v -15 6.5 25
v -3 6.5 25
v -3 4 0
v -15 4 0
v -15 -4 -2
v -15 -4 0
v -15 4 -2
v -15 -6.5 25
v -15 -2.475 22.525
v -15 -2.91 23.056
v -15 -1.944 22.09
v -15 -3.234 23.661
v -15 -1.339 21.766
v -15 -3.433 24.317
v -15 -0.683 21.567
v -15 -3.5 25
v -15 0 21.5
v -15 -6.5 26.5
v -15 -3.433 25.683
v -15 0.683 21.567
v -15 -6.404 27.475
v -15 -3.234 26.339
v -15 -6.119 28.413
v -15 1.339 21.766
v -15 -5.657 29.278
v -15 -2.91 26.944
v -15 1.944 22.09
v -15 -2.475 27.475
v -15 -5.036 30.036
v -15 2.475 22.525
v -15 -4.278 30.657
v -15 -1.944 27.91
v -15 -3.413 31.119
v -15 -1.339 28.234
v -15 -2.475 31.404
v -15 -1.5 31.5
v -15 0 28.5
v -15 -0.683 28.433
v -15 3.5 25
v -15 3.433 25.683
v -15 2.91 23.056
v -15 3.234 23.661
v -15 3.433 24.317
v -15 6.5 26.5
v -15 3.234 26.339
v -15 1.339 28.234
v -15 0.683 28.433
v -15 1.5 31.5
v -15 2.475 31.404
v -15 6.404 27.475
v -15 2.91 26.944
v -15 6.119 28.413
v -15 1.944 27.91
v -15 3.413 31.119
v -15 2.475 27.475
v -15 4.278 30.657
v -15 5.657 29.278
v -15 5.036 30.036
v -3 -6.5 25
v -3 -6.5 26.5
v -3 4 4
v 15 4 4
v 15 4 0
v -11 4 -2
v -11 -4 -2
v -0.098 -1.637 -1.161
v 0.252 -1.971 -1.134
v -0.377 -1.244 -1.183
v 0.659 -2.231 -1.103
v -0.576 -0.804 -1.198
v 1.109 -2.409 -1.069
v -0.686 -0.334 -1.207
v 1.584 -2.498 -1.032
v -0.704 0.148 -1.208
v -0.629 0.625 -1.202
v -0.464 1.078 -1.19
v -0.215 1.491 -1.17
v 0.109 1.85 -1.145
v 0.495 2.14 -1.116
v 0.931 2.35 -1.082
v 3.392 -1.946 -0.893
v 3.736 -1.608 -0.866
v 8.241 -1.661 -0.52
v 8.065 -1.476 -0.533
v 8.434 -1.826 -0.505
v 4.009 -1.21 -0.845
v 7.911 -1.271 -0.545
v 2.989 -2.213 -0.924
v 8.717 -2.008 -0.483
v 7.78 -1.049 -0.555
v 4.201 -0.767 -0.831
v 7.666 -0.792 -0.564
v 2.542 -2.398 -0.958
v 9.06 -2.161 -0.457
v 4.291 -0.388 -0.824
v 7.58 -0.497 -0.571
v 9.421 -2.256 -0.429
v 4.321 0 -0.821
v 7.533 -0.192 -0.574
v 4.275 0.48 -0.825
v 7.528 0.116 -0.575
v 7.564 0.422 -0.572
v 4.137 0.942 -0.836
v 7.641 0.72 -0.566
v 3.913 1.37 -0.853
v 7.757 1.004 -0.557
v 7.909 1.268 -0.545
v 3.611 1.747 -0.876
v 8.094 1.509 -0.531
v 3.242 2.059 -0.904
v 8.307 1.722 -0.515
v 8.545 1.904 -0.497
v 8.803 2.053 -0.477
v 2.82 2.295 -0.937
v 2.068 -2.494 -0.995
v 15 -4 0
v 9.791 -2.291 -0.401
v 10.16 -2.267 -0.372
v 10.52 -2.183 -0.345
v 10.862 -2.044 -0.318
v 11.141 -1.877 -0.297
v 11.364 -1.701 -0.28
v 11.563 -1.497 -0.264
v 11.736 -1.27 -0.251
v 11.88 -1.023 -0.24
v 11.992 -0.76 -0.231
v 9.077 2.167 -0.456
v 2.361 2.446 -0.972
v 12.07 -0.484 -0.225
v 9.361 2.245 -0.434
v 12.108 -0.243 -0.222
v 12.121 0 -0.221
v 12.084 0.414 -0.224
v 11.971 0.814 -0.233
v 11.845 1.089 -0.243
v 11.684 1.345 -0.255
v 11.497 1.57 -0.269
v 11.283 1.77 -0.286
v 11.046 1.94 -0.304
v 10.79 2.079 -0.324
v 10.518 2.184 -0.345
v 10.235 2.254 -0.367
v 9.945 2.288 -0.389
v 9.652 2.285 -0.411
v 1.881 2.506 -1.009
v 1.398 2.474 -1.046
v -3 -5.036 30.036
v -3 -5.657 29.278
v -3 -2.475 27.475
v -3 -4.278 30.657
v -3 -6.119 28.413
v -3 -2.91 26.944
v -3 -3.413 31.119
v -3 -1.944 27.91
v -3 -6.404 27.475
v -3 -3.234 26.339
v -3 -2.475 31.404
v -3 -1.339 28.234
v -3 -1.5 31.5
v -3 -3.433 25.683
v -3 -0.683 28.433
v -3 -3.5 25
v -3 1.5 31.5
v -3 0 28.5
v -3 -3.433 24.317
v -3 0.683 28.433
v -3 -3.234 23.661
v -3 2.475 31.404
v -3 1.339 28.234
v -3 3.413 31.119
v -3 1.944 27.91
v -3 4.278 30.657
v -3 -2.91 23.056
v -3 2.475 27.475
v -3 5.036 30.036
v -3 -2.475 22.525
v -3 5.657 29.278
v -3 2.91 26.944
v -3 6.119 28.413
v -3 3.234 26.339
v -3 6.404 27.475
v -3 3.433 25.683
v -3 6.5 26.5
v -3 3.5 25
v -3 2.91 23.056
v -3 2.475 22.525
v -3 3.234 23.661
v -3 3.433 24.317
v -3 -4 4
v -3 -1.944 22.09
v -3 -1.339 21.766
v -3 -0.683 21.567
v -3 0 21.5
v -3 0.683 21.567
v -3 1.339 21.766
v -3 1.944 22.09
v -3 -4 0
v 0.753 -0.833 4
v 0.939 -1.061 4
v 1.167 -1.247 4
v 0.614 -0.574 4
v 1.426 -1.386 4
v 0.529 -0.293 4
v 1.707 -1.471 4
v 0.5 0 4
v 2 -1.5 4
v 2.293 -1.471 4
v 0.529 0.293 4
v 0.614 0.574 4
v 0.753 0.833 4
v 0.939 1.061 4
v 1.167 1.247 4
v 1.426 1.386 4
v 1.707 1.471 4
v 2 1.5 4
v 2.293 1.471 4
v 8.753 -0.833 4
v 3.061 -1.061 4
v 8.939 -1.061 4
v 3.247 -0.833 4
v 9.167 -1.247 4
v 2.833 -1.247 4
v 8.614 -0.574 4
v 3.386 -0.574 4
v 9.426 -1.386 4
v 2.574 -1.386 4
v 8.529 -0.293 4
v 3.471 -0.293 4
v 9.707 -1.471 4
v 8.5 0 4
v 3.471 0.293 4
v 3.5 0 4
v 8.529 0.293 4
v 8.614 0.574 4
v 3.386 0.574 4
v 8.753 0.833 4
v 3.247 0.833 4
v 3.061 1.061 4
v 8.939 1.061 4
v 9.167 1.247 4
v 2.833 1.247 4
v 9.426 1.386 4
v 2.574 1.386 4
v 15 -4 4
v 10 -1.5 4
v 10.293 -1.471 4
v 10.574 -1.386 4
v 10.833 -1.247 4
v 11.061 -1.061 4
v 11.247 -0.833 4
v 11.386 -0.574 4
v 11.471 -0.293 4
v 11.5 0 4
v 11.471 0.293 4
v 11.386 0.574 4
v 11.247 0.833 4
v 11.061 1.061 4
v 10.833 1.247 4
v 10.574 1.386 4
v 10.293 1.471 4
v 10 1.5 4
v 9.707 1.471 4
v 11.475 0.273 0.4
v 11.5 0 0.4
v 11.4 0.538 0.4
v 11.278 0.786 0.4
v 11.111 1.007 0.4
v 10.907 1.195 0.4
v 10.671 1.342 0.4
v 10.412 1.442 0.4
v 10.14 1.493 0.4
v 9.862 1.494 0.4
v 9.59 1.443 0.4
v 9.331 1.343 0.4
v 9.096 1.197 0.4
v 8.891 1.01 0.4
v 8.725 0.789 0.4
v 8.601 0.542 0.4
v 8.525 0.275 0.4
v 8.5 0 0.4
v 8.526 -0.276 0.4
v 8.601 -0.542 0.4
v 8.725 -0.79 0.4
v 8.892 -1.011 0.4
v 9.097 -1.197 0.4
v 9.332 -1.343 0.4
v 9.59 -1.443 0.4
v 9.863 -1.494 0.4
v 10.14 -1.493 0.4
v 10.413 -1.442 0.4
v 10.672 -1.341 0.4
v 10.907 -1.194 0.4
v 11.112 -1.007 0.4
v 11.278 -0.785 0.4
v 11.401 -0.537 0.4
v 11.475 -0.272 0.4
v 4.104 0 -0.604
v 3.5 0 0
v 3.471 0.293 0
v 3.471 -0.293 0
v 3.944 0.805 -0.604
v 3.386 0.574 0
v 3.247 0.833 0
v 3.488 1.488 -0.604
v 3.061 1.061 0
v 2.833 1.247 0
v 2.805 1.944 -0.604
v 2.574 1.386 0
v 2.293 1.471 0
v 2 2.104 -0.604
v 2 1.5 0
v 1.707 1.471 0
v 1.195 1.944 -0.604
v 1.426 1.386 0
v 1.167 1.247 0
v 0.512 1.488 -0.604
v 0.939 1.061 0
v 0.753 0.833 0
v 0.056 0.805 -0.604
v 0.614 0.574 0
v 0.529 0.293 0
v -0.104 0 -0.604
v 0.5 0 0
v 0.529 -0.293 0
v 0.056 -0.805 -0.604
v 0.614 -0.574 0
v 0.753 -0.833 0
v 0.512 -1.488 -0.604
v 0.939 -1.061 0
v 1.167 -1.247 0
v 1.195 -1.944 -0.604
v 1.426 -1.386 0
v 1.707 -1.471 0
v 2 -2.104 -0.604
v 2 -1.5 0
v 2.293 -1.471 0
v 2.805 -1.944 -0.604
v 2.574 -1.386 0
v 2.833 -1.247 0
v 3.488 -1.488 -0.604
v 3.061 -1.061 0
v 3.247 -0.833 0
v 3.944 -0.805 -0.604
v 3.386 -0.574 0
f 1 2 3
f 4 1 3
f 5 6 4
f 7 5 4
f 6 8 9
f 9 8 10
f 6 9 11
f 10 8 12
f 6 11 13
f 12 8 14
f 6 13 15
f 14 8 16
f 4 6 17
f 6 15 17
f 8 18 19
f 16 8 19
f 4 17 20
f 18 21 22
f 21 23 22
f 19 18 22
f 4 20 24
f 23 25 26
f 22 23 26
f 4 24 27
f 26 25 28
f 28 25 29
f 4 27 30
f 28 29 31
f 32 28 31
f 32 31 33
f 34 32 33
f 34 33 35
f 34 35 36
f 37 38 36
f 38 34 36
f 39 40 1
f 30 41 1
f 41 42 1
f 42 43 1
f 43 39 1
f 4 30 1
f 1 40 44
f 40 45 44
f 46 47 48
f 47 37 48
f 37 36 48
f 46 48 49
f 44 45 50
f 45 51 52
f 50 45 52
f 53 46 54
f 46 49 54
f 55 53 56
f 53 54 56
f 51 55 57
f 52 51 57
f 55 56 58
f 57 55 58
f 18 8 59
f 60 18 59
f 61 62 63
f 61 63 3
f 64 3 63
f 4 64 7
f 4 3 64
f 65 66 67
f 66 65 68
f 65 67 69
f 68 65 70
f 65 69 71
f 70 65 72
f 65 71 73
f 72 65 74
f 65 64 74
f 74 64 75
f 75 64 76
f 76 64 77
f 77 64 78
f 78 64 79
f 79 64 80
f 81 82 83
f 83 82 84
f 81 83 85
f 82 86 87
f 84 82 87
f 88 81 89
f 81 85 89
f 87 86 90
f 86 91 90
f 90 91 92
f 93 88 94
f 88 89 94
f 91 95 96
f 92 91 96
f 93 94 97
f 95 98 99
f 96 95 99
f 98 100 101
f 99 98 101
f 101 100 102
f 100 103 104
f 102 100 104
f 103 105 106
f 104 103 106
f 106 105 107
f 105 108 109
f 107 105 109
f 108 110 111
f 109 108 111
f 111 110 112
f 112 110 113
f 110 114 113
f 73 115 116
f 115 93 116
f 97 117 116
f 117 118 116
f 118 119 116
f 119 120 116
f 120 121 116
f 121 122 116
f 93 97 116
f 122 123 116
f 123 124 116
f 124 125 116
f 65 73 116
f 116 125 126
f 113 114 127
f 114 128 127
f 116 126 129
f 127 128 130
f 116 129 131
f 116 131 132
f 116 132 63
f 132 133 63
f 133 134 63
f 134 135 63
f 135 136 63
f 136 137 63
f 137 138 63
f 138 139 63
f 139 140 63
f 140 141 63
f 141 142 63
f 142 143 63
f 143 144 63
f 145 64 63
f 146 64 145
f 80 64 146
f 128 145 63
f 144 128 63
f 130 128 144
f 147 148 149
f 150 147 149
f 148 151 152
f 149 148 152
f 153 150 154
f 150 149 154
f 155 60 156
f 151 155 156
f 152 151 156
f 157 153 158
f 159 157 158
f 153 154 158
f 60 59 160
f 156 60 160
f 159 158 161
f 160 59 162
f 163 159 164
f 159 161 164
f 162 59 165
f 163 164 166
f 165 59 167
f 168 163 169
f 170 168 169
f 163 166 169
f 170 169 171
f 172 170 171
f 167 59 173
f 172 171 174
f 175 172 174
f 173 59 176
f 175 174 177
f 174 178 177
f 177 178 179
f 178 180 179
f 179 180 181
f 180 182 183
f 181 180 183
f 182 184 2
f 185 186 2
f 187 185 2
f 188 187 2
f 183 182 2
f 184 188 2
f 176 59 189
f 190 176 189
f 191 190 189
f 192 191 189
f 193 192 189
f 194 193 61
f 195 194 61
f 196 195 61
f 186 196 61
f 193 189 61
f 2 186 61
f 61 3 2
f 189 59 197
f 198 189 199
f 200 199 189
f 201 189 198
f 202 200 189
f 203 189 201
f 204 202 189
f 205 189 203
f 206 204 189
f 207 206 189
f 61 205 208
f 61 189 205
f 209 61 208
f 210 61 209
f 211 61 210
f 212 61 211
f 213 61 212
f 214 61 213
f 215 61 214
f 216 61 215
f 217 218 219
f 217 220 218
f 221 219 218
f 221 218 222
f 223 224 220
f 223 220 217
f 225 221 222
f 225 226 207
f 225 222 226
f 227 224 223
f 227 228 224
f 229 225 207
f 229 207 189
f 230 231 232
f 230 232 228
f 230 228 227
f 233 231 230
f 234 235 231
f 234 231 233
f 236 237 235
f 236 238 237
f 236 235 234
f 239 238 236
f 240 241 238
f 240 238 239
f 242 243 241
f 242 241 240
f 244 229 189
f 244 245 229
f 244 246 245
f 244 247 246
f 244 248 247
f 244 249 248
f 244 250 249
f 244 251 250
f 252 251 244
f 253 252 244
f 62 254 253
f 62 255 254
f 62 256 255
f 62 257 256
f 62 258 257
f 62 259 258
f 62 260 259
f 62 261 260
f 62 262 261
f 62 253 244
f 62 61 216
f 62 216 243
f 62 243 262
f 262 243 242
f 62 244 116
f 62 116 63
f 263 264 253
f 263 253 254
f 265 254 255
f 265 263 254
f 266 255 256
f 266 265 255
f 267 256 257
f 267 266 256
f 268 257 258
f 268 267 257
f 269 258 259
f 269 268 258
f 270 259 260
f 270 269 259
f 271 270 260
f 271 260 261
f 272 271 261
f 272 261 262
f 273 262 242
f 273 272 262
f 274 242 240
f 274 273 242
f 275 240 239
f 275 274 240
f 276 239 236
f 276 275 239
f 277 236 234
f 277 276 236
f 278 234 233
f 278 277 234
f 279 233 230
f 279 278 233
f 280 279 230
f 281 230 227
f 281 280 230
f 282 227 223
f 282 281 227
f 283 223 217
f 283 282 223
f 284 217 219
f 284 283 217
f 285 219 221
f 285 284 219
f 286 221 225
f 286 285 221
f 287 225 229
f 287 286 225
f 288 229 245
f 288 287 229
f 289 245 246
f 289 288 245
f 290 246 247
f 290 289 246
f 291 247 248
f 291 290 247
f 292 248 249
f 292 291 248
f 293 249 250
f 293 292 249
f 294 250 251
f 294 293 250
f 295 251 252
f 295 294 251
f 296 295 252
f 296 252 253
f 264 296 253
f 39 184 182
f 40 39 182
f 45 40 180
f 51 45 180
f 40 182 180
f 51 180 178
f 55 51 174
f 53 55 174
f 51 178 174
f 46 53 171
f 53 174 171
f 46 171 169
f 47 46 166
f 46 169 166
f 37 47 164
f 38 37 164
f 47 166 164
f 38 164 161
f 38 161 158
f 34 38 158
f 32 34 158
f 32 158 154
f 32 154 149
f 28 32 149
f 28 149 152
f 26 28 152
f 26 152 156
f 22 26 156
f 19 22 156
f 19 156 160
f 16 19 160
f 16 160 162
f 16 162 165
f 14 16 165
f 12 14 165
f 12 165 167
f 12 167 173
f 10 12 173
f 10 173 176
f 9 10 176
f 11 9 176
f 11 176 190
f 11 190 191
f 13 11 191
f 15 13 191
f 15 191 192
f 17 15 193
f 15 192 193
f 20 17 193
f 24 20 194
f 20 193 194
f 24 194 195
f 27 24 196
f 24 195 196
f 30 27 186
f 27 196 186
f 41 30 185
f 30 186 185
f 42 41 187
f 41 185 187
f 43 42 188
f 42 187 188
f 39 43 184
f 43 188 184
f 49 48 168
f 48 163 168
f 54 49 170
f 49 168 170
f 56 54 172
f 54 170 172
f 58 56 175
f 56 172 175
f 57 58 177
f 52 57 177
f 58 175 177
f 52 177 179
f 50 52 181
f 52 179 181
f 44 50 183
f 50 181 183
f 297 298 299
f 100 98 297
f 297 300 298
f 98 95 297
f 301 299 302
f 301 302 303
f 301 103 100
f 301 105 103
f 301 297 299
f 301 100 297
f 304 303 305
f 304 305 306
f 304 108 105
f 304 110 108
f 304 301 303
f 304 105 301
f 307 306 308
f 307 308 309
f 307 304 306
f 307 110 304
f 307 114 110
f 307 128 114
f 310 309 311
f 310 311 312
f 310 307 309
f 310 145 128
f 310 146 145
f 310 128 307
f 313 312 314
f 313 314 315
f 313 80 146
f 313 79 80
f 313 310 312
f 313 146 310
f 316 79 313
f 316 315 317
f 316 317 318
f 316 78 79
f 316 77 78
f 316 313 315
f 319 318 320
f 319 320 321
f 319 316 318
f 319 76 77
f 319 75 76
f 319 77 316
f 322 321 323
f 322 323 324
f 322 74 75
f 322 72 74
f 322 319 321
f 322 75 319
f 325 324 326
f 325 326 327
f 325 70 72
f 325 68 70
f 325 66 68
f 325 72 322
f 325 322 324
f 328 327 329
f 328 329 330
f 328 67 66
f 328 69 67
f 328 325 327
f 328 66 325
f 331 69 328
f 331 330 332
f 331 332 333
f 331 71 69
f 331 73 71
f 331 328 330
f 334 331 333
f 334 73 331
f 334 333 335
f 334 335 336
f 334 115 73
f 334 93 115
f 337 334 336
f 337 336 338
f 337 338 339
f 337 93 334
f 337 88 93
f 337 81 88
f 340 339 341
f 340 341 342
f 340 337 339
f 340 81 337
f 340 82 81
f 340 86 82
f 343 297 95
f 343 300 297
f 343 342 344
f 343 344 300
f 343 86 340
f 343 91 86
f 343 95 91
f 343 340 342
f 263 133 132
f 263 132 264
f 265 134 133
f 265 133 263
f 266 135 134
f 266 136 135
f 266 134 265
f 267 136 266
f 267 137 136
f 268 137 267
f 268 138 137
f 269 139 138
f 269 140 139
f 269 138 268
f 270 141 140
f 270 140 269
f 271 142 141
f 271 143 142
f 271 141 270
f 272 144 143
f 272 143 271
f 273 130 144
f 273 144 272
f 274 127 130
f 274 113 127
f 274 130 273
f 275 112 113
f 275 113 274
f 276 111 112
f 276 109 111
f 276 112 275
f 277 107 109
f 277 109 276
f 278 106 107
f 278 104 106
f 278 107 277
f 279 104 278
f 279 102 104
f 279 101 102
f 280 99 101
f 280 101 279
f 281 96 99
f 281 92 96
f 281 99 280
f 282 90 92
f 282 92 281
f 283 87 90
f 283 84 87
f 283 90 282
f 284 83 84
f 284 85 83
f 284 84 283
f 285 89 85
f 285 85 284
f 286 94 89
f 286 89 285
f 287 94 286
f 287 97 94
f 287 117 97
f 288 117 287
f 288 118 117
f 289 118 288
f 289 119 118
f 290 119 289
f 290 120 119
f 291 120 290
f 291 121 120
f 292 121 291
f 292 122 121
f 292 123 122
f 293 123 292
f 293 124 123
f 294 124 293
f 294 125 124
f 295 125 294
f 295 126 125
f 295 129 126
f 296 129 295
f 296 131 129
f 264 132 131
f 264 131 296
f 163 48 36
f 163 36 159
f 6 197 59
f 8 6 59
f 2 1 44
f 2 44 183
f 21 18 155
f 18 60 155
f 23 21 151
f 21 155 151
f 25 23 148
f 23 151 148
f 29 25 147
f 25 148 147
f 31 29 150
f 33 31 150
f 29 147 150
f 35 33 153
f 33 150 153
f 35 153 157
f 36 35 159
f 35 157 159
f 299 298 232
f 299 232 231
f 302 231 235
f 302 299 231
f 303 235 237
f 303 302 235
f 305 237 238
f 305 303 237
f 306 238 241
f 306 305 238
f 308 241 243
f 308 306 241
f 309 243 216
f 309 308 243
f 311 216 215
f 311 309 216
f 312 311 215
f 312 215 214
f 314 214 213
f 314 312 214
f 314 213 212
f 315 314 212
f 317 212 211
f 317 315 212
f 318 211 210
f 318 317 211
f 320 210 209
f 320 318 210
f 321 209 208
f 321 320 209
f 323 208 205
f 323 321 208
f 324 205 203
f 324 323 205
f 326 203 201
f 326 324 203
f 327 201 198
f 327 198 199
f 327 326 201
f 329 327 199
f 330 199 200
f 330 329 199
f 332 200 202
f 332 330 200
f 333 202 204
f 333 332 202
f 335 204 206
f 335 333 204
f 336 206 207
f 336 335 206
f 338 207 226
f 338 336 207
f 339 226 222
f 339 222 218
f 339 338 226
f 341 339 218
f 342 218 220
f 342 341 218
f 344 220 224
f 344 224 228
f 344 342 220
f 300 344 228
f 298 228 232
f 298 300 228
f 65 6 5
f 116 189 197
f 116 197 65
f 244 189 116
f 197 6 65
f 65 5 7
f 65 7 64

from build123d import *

# Parameters (mm, degrees)
F0_W        = 18
F0_H        = 8
F0_R        = 1.5
F1_DEPTH    = 4
F0_W_2      = 12
F0_H_2      = 2.5
F2_DEPTH    = 31.5
F3_R        = 3.5
F4_DEPTH    = 12.001
F5_R        = 5
F6_DEPTH    = 2
F8_SIZE     = 2.4
F9_T1_DEPTH = 143.1852716253


# Not quite as in the source:
# - a fillet or chamfer that OpenCascade refuses, or shapes differently, is made with other operations: its cross-section is extruded or revolved along the edge and cut away or added


with BuildPart() as f1:
    # F0 (on Top) → F1 (new body)
    with BuildSketch(Plane.XY):
        with Locations((6, 0)):
            Rectangle(F0_W, F0_H)
        with Locations((2, 0)):
            Circle(F0_R, mode=Mode.SUBTRACT)
        with Locations((10, 0)):
            Circle(F0_R, mode=Mode.SUBTRACT)
    extrude(amount=F1_DEPTH)

    # F0 (on Top) → F2 (join)
    with BuildSketch(Plane.XY):
        with Locations((-9, -5.25)):
            Rectangle(F0_W_2, F0_H_2)
        with Locations((-9, 0)):
            Rectangle(F0_W_2, F0_H)
        with Locations((-9, 5.25)):
            Rectangle(F0_W_2, F0_H_2)
    extrude(amount=F2_DEPTH)

    # F3 (on face) → F4 (cut, through all)
    with BuildSketch(Plane.YZ.offset(-3)):
        Polygon((-6.5, 0), (-4, 0), (-6.5, 25), align=None)
        Polygon((6.5, 25), (4, 0), (6.5, 0), align=None)
        with Locations((0, 25)):
            Circle(F3_R)
    extrude(amount=-F4_DEPTH, mode=Mode.SUBTRACT)

    # F5
    f5_edges = [f1.edges().sort_by_distance(p)[0] for p in [
        (-9, 6.5, 31.5),
        (-9, -6.5, 31.5),
    ]]
    fillet(f5_edges, radius=F5_R)

    # F0 (on Top) → F6 (join)
    with BuildSketch(Plane.XY):
        with Locations((6, 0)):
            Rectangle(F0_W, F0_H)
        with Locations((2, 0)):
            Circle(F0_R, mode=Mode.SUBTRACT)
        with Locations((10, 0)):
            Circle(F0_R, mode=Mode.SUBTRACT)
        with Locations((-9, 0)):
            Rectangle(F0_W_2, F0_H)
    extrude(amount=-F6_DEPTH)

    # F7: chamfer of 2 on 1 edges, made by hand

    # F7_s1 → F7_t2 (revolve, cut)
    with BuildSketch(Plane.XZ):
        Polygon((3.5, 0), (5.5, -2), (3.5, -2), align=None)
    revolve(axis=Axis((2, 0, -2), (0, 0, 1)), mode=Mode.SUBTRACT)

    # F8
    f8_edges = [f1.edges().sort_by_distance(p)[0] for p in [
        (8.5, 0, -2),
    ]]
    chamfer(f8_edges, length=F8_SIZE)

    # F9: chamfer of 2 x 26 on 1 edges, made by hand

    # F9_s2 → F9_t1 (cut)
    with BuildSketch(Plane.XZ.offset(-71.5926358126)):
        Polygon((-11, -2), (15, 0), (15, -2), align=None)
    extrude(amount=F9_T1_DEPTH, mode=Mode.SUBTRACT)


solid = f1.part
